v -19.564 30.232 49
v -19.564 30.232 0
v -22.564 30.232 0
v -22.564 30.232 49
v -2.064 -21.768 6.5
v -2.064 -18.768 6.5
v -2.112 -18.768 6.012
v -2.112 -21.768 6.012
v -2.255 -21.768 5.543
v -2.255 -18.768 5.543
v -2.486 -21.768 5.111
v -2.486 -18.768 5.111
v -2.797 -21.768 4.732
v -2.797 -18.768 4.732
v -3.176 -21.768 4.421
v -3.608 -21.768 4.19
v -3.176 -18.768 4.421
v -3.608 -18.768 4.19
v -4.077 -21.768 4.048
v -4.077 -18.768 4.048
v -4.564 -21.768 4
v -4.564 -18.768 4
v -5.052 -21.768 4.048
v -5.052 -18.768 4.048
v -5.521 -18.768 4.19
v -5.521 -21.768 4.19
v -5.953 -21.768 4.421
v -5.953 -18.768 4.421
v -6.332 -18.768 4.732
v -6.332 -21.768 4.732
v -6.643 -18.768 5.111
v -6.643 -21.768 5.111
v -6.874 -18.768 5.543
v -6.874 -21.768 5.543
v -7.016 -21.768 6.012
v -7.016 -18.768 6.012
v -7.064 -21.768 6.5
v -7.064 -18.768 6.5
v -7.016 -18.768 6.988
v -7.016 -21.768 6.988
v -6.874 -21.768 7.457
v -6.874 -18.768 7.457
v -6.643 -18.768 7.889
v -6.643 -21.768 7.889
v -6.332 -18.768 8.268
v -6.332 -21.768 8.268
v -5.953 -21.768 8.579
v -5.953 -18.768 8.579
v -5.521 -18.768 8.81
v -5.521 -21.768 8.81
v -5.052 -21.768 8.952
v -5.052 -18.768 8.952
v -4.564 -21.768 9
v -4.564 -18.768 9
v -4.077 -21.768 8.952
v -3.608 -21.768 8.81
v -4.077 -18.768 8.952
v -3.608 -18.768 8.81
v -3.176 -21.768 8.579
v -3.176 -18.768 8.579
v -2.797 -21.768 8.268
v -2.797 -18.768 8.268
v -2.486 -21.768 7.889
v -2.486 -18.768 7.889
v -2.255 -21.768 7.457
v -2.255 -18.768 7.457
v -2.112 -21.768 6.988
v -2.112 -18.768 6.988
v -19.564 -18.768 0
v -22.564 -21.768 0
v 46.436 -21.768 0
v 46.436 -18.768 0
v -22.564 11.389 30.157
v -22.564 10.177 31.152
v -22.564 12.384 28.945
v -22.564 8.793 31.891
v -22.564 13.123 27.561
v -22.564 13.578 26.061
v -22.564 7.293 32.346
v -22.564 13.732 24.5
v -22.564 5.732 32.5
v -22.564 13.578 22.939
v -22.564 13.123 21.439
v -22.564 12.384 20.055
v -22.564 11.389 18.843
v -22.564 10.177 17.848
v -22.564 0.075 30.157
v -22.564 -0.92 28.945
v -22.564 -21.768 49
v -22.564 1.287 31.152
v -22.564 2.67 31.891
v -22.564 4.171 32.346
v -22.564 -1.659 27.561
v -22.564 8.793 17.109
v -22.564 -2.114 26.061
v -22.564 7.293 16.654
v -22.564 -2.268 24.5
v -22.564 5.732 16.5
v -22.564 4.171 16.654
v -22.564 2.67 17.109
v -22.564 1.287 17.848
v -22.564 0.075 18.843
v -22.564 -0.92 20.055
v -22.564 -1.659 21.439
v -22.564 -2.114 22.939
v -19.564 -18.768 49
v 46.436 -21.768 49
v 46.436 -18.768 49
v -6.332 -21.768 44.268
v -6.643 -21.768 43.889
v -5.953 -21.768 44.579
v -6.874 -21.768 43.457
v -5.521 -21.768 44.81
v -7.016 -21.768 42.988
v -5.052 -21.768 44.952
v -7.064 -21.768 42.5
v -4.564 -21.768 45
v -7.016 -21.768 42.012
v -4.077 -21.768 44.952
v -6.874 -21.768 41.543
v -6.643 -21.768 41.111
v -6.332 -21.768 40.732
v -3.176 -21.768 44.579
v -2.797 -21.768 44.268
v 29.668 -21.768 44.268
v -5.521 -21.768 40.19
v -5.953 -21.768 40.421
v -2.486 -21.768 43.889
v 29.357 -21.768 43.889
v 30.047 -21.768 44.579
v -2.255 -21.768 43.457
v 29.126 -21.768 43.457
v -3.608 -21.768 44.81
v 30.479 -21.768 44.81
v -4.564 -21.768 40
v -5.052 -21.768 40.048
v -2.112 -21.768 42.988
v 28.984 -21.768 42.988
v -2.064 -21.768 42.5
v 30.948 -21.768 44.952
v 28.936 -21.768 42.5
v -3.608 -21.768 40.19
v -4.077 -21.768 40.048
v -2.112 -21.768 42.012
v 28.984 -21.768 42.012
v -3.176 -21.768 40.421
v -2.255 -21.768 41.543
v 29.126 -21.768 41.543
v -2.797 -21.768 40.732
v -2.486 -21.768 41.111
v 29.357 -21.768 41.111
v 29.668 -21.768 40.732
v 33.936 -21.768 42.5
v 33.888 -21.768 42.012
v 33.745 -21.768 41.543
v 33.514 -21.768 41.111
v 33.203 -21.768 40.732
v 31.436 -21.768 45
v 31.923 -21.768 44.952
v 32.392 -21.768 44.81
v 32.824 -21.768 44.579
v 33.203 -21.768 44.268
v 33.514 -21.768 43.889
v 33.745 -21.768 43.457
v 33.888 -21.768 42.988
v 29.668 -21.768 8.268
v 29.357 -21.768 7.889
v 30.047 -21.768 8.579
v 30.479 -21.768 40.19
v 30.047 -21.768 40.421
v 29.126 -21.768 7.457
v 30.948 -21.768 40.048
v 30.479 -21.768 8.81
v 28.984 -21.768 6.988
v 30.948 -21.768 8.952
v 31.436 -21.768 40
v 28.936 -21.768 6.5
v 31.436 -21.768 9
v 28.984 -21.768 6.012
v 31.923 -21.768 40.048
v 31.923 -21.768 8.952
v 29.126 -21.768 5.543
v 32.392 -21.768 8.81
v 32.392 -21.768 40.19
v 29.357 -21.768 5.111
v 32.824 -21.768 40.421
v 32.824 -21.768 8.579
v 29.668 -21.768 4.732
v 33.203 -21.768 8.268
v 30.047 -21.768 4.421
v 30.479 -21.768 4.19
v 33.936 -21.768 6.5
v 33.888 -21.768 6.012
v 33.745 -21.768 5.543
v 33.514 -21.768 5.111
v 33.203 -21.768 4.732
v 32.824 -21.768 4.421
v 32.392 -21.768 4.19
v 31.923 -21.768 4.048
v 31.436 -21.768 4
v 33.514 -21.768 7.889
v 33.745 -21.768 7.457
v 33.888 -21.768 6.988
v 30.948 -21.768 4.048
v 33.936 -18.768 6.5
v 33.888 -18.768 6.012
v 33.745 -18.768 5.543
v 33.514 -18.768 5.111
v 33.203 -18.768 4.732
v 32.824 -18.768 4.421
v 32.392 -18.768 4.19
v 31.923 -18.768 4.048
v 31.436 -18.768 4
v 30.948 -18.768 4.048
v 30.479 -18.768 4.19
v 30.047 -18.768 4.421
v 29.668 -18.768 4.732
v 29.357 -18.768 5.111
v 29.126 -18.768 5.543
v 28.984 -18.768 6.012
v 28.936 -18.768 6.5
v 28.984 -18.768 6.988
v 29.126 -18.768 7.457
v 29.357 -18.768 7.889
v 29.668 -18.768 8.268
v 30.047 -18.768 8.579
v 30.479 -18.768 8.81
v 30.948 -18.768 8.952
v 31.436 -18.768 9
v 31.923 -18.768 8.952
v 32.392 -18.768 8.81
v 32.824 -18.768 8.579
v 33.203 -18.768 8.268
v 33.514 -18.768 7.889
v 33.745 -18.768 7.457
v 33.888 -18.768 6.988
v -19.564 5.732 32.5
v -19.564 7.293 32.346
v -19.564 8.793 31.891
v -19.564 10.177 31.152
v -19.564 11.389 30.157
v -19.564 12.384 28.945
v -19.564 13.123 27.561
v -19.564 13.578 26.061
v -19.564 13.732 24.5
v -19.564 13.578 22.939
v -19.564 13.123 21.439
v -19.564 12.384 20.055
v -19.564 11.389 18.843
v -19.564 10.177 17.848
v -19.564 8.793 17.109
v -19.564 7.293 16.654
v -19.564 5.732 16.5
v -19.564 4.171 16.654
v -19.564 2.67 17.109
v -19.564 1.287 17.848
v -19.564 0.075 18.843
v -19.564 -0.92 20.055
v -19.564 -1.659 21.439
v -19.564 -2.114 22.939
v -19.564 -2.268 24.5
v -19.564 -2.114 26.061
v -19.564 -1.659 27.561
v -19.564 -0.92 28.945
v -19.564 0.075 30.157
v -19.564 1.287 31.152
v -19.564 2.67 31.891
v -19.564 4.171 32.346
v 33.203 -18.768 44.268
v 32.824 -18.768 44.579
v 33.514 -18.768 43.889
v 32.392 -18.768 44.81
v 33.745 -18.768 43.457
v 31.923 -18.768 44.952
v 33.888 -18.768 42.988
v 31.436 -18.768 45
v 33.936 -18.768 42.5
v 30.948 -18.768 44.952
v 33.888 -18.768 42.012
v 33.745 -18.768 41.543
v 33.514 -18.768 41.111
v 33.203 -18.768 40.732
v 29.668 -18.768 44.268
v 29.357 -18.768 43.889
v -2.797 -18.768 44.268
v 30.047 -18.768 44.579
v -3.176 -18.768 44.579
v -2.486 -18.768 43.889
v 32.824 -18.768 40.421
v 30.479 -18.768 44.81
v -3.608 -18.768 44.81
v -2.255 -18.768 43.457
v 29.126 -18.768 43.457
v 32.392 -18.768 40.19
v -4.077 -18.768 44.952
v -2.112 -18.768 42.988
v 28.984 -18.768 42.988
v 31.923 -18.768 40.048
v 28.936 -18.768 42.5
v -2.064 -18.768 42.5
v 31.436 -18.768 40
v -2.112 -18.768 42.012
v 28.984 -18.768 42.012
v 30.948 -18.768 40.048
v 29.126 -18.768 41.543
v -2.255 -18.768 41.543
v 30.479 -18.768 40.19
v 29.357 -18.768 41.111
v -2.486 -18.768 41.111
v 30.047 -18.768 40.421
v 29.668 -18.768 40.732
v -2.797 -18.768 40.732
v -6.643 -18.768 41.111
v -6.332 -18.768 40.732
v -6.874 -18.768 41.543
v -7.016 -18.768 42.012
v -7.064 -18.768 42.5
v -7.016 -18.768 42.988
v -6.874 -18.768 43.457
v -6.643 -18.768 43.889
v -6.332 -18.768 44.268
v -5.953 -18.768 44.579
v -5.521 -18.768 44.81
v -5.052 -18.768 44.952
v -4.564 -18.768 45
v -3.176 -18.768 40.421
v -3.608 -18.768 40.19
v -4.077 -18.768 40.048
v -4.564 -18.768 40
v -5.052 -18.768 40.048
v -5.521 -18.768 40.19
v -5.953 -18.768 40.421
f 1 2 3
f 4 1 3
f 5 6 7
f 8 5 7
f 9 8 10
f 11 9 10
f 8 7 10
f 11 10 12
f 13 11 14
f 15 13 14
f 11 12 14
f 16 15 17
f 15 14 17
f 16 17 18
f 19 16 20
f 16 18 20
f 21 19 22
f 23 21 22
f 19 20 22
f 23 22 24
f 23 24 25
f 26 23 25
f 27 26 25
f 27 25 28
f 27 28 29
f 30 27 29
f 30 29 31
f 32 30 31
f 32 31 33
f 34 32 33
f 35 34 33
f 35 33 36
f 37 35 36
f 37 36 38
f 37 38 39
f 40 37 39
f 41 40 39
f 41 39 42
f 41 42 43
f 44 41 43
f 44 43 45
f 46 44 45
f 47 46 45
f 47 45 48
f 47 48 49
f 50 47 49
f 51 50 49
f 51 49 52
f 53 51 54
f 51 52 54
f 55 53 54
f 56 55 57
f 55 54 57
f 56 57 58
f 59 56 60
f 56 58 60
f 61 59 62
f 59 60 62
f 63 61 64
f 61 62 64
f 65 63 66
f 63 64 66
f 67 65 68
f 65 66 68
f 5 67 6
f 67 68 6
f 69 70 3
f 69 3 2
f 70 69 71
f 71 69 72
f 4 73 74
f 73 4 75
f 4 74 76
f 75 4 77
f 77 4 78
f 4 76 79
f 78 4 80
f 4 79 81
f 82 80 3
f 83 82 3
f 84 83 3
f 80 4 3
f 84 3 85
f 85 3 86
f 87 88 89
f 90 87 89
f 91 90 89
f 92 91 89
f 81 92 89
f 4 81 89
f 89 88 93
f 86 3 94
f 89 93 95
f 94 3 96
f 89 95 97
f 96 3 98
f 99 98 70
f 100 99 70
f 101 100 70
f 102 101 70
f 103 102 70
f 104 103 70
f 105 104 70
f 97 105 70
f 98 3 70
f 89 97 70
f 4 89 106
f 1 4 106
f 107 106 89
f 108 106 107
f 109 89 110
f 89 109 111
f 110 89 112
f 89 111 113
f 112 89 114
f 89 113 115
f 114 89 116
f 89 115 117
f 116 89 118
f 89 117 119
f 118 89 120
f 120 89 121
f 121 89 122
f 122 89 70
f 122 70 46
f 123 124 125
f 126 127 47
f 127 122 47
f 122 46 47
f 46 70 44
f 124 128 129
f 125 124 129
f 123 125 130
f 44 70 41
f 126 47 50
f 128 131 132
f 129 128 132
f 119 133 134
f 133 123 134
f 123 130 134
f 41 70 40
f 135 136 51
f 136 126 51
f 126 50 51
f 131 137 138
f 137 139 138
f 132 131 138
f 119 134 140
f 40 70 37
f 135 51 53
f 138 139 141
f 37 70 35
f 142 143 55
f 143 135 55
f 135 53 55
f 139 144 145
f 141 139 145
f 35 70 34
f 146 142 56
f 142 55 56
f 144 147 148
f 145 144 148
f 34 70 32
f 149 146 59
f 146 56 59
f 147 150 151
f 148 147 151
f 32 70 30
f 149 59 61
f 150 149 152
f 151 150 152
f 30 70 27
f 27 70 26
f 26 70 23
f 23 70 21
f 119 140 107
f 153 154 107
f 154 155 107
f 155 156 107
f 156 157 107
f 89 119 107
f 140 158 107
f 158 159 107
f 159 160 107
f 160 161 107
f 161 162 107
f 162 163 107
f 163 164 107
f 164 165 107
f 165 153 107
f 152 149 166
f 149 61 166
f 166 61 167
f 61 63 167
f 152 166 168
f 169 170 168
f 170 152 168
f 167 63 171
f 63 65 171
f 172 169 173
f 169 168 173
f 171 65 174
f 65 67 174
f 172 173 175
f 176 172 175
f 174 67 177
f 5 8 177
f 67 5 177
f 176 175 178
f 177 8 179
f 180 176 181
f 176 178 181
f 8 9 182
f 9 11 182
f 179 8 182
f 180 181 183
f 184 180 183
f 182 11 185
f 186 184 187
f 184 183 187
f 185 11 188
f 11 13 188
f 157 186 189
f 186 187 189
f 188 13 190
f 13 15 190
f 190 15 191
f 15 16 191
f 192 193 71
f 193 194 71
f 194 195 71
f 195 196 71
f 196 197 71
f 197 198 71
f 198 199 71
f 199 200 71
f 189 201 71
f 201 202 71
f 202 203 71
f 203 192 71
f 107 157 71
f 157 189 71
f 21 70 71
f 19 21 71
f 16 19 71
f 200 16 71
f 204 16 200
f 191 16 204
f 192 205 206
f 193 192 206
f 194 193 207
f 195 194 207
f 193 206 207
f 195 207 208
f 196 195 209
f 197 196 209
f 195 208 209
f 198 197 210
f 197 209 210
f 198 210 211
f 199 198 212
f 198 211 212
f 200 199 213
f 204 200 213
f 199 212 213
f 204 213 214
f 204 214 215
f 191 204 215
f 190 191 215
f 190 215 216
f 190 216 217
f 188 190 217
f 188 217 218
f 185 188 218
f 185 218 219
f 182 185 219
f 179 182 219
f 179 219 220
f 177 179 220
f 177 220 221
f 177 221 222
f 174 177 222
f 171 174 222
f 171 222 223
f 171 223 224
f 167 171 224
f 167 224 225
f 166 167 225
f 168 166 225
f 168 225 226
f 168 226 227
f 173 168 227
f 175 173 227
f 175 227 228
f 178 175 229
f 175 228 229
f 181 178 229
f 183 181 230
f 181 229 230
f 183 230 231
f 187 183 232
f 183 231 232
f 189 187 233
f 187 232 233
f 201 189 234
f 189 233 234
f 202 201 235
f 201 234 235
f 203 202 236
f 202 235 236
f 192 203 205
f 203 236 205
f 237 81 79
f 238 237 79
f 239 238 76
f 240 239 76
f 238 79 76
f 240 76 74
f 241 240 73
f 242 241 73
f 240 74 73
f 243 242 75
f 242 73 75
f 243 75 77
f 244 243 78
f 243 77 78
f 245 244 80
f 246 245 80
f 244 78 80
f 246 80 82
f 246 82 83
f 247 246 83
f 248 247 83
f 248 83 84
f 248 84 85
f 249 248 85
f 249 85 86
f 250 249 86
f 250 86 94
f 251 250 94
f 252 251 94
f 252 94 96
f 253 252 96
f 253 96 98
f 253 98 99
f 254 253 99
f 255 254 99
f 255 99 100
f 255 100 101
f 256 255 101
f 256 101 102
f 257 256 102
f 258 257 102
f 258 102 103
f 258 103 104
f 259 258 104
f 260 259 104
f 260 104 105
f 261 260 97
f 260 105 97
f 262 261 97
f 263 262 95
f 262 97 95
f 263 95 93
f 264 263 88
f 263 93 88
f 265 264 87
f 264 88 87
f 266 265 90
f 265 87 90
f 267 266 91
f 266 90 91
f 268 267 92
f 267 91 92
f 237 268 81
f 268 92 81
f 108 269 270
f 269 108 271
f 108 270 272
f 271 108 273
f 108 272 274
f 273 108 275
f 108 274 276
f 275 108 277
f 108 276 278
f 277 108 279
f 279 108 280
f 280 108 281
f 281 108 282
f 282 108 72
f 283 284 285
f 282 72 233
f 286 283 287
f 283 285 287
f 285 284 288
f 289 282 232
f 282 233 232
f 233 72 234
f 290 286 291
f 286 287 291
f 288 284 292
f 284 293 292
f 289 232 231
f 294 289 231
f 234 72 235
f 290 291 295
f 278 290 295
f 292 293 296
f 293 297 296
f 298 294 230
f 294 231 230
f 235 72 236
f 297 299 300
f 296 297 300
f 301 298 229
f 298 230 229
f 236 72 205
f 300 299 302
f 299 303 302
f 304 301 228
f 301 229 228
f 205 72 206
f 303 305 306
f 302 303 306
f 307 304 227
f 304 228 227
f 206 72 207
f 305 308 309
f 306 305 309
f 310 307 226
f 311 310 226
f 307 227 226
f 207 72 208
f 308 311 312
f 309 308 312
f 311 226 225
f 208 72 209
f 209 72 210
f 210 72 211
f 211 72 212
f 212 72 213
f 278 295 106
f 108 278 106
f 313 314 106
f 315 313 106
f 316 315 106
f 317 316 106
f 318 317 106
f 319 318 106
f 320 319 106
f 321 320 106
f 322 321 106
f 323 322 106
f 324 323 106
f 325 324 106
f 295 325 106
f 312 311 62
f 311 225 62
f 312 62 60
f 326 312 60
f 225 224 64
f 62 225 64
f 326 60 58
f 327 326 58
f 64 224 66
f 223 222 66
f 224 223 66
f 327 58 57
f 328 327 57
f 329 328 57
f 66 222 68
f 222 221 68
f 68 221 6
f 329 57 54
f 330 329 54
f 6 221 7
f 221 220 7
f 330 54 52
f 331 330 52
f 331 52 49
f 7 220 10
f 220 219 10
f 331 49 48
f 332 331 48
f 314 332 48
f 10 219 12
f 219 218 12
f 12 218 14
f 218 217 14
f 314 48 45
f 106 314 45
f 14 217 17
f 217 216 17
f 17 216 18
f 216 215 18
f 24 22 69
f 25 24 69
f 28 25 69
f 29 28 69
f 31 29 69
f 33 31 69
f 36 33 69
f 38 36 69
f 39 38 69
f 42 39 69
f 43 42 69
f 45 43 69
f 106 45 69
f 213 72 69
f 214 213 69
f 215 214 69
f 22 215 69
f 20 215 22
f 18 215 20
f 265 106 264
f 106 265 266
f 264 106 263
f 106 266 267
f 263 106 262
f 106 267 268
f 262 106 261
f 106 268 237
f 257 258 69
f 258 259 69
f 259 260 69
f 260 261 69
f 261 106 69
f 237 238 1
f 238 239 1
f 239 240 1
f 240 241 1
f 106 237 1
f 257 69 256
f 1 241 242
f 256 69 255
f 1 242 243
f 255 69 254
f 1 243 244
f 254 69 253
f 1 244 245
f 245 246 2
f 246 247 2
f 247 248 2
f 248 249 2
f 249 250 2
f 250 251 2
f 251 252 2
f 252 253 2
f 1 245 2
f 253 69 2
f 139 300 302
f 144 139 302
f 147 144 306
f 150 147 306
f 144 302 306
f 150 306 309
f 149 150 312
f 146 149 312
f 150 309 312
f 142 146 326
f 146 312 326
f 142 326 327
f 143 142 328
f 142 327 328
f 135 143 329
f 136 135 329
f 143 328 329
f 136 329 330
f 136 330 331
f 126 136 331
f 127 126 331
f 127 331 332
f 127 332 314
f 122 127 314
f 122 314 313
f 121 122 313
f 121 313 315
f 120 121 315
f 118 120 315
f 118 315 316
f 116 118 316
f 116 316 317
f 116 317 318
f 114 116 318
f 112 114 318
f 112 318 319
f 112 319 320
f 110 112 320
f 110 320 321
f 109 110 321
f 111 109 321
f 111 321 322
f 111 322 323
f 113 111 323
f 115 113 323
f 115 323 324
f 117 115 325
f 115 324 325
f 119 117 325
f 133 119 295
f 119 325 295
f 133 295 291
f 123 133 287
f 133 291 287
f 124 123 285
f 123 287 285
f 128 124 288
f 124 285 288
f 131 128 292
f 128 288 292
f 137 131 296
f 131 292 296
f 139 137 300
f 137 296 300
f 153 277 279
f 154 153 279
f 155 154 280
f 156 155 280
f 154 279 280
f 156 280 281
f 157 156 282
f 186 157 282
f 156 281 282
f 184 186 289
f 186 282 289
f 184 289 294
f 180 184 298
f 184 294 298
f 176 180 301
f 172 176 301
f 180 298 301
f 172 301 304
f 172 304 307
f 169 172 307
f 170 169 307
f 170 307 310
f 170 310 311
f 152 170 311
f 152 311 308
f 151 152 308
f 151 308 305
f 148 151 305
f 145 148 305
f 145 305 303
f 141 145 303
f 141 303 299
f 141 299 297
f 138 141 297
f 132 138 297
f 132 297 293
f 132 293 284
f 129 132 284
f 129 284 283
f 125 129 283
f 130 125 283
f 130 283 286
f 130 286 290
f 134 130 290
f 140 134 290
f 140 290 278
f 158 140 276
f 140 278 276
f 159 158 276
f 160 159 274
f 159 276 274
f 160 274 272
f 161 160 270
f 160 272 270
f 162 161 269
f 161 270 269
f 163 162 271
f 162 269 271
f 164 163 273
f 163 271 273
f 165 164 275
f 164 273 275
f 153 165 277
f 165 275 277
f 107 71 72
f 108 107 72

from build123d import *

# Parameters (mm, degrees)
EXTRUDE_1_DEPTH     = 49
SKETCH_2_R          = 2.5
CUT_EXTRUDE_1_DEPTH = 49
SKETCH_3_R          = 8
CUT_EXTRUDE_2_DEPTH = 49


with BuildPart() as part:
    # 草图1 → 凸台-拉伸1 (new body)
    with BuildSketch(Plane.XY):
        Polygon((-22.564432673, 30.231958763), (-22.564432673, -21.768041237), (46.435567327, -21.768041237), (46.435567327, -18.768041237), (-19.564432673, -18.768041237), (-19.564432673, 30.231958763), align=None)
    extrude(amount=EXTRUDE_1_DEPTH)

    # 草图2 → 切除-拉伸1 (cut)
    with BuildSketch(Plane(origin=(0, -18.768041237, 0), x_dir=(1, 0, 0), z_dir=(0, 1, 0))):
        with Locations((-4.564432673, -6.5)):
            Circle(SKETCH_2_R)
        with Locations((31.435567327, -6.5)):
            Circle(SKETCH_2_R)
        with Locations((-4.564432673, -42.5)):
            Circle(SKETCH_2_R)
        with Locations((31.435567327, -42.5)):
            Circle(SKETCH_2_R)
    extrude(amount=-CUT_EXTRUDE_1_DEPTH, mode=Mode.SUBTRACT)

    # 草图3 → 切除-拉伸2 (cut)
    with BuildSketch(Plane.ZY.offset(22.564432673)):
        with Locations((24.5, 5.731958763)):
            Circle(SKETCH_3_R)
    extrude(amount=-CUT_EXTRUDE_2_DEPTH, mode=Mode.SUBTRACT)


solid = part.part
